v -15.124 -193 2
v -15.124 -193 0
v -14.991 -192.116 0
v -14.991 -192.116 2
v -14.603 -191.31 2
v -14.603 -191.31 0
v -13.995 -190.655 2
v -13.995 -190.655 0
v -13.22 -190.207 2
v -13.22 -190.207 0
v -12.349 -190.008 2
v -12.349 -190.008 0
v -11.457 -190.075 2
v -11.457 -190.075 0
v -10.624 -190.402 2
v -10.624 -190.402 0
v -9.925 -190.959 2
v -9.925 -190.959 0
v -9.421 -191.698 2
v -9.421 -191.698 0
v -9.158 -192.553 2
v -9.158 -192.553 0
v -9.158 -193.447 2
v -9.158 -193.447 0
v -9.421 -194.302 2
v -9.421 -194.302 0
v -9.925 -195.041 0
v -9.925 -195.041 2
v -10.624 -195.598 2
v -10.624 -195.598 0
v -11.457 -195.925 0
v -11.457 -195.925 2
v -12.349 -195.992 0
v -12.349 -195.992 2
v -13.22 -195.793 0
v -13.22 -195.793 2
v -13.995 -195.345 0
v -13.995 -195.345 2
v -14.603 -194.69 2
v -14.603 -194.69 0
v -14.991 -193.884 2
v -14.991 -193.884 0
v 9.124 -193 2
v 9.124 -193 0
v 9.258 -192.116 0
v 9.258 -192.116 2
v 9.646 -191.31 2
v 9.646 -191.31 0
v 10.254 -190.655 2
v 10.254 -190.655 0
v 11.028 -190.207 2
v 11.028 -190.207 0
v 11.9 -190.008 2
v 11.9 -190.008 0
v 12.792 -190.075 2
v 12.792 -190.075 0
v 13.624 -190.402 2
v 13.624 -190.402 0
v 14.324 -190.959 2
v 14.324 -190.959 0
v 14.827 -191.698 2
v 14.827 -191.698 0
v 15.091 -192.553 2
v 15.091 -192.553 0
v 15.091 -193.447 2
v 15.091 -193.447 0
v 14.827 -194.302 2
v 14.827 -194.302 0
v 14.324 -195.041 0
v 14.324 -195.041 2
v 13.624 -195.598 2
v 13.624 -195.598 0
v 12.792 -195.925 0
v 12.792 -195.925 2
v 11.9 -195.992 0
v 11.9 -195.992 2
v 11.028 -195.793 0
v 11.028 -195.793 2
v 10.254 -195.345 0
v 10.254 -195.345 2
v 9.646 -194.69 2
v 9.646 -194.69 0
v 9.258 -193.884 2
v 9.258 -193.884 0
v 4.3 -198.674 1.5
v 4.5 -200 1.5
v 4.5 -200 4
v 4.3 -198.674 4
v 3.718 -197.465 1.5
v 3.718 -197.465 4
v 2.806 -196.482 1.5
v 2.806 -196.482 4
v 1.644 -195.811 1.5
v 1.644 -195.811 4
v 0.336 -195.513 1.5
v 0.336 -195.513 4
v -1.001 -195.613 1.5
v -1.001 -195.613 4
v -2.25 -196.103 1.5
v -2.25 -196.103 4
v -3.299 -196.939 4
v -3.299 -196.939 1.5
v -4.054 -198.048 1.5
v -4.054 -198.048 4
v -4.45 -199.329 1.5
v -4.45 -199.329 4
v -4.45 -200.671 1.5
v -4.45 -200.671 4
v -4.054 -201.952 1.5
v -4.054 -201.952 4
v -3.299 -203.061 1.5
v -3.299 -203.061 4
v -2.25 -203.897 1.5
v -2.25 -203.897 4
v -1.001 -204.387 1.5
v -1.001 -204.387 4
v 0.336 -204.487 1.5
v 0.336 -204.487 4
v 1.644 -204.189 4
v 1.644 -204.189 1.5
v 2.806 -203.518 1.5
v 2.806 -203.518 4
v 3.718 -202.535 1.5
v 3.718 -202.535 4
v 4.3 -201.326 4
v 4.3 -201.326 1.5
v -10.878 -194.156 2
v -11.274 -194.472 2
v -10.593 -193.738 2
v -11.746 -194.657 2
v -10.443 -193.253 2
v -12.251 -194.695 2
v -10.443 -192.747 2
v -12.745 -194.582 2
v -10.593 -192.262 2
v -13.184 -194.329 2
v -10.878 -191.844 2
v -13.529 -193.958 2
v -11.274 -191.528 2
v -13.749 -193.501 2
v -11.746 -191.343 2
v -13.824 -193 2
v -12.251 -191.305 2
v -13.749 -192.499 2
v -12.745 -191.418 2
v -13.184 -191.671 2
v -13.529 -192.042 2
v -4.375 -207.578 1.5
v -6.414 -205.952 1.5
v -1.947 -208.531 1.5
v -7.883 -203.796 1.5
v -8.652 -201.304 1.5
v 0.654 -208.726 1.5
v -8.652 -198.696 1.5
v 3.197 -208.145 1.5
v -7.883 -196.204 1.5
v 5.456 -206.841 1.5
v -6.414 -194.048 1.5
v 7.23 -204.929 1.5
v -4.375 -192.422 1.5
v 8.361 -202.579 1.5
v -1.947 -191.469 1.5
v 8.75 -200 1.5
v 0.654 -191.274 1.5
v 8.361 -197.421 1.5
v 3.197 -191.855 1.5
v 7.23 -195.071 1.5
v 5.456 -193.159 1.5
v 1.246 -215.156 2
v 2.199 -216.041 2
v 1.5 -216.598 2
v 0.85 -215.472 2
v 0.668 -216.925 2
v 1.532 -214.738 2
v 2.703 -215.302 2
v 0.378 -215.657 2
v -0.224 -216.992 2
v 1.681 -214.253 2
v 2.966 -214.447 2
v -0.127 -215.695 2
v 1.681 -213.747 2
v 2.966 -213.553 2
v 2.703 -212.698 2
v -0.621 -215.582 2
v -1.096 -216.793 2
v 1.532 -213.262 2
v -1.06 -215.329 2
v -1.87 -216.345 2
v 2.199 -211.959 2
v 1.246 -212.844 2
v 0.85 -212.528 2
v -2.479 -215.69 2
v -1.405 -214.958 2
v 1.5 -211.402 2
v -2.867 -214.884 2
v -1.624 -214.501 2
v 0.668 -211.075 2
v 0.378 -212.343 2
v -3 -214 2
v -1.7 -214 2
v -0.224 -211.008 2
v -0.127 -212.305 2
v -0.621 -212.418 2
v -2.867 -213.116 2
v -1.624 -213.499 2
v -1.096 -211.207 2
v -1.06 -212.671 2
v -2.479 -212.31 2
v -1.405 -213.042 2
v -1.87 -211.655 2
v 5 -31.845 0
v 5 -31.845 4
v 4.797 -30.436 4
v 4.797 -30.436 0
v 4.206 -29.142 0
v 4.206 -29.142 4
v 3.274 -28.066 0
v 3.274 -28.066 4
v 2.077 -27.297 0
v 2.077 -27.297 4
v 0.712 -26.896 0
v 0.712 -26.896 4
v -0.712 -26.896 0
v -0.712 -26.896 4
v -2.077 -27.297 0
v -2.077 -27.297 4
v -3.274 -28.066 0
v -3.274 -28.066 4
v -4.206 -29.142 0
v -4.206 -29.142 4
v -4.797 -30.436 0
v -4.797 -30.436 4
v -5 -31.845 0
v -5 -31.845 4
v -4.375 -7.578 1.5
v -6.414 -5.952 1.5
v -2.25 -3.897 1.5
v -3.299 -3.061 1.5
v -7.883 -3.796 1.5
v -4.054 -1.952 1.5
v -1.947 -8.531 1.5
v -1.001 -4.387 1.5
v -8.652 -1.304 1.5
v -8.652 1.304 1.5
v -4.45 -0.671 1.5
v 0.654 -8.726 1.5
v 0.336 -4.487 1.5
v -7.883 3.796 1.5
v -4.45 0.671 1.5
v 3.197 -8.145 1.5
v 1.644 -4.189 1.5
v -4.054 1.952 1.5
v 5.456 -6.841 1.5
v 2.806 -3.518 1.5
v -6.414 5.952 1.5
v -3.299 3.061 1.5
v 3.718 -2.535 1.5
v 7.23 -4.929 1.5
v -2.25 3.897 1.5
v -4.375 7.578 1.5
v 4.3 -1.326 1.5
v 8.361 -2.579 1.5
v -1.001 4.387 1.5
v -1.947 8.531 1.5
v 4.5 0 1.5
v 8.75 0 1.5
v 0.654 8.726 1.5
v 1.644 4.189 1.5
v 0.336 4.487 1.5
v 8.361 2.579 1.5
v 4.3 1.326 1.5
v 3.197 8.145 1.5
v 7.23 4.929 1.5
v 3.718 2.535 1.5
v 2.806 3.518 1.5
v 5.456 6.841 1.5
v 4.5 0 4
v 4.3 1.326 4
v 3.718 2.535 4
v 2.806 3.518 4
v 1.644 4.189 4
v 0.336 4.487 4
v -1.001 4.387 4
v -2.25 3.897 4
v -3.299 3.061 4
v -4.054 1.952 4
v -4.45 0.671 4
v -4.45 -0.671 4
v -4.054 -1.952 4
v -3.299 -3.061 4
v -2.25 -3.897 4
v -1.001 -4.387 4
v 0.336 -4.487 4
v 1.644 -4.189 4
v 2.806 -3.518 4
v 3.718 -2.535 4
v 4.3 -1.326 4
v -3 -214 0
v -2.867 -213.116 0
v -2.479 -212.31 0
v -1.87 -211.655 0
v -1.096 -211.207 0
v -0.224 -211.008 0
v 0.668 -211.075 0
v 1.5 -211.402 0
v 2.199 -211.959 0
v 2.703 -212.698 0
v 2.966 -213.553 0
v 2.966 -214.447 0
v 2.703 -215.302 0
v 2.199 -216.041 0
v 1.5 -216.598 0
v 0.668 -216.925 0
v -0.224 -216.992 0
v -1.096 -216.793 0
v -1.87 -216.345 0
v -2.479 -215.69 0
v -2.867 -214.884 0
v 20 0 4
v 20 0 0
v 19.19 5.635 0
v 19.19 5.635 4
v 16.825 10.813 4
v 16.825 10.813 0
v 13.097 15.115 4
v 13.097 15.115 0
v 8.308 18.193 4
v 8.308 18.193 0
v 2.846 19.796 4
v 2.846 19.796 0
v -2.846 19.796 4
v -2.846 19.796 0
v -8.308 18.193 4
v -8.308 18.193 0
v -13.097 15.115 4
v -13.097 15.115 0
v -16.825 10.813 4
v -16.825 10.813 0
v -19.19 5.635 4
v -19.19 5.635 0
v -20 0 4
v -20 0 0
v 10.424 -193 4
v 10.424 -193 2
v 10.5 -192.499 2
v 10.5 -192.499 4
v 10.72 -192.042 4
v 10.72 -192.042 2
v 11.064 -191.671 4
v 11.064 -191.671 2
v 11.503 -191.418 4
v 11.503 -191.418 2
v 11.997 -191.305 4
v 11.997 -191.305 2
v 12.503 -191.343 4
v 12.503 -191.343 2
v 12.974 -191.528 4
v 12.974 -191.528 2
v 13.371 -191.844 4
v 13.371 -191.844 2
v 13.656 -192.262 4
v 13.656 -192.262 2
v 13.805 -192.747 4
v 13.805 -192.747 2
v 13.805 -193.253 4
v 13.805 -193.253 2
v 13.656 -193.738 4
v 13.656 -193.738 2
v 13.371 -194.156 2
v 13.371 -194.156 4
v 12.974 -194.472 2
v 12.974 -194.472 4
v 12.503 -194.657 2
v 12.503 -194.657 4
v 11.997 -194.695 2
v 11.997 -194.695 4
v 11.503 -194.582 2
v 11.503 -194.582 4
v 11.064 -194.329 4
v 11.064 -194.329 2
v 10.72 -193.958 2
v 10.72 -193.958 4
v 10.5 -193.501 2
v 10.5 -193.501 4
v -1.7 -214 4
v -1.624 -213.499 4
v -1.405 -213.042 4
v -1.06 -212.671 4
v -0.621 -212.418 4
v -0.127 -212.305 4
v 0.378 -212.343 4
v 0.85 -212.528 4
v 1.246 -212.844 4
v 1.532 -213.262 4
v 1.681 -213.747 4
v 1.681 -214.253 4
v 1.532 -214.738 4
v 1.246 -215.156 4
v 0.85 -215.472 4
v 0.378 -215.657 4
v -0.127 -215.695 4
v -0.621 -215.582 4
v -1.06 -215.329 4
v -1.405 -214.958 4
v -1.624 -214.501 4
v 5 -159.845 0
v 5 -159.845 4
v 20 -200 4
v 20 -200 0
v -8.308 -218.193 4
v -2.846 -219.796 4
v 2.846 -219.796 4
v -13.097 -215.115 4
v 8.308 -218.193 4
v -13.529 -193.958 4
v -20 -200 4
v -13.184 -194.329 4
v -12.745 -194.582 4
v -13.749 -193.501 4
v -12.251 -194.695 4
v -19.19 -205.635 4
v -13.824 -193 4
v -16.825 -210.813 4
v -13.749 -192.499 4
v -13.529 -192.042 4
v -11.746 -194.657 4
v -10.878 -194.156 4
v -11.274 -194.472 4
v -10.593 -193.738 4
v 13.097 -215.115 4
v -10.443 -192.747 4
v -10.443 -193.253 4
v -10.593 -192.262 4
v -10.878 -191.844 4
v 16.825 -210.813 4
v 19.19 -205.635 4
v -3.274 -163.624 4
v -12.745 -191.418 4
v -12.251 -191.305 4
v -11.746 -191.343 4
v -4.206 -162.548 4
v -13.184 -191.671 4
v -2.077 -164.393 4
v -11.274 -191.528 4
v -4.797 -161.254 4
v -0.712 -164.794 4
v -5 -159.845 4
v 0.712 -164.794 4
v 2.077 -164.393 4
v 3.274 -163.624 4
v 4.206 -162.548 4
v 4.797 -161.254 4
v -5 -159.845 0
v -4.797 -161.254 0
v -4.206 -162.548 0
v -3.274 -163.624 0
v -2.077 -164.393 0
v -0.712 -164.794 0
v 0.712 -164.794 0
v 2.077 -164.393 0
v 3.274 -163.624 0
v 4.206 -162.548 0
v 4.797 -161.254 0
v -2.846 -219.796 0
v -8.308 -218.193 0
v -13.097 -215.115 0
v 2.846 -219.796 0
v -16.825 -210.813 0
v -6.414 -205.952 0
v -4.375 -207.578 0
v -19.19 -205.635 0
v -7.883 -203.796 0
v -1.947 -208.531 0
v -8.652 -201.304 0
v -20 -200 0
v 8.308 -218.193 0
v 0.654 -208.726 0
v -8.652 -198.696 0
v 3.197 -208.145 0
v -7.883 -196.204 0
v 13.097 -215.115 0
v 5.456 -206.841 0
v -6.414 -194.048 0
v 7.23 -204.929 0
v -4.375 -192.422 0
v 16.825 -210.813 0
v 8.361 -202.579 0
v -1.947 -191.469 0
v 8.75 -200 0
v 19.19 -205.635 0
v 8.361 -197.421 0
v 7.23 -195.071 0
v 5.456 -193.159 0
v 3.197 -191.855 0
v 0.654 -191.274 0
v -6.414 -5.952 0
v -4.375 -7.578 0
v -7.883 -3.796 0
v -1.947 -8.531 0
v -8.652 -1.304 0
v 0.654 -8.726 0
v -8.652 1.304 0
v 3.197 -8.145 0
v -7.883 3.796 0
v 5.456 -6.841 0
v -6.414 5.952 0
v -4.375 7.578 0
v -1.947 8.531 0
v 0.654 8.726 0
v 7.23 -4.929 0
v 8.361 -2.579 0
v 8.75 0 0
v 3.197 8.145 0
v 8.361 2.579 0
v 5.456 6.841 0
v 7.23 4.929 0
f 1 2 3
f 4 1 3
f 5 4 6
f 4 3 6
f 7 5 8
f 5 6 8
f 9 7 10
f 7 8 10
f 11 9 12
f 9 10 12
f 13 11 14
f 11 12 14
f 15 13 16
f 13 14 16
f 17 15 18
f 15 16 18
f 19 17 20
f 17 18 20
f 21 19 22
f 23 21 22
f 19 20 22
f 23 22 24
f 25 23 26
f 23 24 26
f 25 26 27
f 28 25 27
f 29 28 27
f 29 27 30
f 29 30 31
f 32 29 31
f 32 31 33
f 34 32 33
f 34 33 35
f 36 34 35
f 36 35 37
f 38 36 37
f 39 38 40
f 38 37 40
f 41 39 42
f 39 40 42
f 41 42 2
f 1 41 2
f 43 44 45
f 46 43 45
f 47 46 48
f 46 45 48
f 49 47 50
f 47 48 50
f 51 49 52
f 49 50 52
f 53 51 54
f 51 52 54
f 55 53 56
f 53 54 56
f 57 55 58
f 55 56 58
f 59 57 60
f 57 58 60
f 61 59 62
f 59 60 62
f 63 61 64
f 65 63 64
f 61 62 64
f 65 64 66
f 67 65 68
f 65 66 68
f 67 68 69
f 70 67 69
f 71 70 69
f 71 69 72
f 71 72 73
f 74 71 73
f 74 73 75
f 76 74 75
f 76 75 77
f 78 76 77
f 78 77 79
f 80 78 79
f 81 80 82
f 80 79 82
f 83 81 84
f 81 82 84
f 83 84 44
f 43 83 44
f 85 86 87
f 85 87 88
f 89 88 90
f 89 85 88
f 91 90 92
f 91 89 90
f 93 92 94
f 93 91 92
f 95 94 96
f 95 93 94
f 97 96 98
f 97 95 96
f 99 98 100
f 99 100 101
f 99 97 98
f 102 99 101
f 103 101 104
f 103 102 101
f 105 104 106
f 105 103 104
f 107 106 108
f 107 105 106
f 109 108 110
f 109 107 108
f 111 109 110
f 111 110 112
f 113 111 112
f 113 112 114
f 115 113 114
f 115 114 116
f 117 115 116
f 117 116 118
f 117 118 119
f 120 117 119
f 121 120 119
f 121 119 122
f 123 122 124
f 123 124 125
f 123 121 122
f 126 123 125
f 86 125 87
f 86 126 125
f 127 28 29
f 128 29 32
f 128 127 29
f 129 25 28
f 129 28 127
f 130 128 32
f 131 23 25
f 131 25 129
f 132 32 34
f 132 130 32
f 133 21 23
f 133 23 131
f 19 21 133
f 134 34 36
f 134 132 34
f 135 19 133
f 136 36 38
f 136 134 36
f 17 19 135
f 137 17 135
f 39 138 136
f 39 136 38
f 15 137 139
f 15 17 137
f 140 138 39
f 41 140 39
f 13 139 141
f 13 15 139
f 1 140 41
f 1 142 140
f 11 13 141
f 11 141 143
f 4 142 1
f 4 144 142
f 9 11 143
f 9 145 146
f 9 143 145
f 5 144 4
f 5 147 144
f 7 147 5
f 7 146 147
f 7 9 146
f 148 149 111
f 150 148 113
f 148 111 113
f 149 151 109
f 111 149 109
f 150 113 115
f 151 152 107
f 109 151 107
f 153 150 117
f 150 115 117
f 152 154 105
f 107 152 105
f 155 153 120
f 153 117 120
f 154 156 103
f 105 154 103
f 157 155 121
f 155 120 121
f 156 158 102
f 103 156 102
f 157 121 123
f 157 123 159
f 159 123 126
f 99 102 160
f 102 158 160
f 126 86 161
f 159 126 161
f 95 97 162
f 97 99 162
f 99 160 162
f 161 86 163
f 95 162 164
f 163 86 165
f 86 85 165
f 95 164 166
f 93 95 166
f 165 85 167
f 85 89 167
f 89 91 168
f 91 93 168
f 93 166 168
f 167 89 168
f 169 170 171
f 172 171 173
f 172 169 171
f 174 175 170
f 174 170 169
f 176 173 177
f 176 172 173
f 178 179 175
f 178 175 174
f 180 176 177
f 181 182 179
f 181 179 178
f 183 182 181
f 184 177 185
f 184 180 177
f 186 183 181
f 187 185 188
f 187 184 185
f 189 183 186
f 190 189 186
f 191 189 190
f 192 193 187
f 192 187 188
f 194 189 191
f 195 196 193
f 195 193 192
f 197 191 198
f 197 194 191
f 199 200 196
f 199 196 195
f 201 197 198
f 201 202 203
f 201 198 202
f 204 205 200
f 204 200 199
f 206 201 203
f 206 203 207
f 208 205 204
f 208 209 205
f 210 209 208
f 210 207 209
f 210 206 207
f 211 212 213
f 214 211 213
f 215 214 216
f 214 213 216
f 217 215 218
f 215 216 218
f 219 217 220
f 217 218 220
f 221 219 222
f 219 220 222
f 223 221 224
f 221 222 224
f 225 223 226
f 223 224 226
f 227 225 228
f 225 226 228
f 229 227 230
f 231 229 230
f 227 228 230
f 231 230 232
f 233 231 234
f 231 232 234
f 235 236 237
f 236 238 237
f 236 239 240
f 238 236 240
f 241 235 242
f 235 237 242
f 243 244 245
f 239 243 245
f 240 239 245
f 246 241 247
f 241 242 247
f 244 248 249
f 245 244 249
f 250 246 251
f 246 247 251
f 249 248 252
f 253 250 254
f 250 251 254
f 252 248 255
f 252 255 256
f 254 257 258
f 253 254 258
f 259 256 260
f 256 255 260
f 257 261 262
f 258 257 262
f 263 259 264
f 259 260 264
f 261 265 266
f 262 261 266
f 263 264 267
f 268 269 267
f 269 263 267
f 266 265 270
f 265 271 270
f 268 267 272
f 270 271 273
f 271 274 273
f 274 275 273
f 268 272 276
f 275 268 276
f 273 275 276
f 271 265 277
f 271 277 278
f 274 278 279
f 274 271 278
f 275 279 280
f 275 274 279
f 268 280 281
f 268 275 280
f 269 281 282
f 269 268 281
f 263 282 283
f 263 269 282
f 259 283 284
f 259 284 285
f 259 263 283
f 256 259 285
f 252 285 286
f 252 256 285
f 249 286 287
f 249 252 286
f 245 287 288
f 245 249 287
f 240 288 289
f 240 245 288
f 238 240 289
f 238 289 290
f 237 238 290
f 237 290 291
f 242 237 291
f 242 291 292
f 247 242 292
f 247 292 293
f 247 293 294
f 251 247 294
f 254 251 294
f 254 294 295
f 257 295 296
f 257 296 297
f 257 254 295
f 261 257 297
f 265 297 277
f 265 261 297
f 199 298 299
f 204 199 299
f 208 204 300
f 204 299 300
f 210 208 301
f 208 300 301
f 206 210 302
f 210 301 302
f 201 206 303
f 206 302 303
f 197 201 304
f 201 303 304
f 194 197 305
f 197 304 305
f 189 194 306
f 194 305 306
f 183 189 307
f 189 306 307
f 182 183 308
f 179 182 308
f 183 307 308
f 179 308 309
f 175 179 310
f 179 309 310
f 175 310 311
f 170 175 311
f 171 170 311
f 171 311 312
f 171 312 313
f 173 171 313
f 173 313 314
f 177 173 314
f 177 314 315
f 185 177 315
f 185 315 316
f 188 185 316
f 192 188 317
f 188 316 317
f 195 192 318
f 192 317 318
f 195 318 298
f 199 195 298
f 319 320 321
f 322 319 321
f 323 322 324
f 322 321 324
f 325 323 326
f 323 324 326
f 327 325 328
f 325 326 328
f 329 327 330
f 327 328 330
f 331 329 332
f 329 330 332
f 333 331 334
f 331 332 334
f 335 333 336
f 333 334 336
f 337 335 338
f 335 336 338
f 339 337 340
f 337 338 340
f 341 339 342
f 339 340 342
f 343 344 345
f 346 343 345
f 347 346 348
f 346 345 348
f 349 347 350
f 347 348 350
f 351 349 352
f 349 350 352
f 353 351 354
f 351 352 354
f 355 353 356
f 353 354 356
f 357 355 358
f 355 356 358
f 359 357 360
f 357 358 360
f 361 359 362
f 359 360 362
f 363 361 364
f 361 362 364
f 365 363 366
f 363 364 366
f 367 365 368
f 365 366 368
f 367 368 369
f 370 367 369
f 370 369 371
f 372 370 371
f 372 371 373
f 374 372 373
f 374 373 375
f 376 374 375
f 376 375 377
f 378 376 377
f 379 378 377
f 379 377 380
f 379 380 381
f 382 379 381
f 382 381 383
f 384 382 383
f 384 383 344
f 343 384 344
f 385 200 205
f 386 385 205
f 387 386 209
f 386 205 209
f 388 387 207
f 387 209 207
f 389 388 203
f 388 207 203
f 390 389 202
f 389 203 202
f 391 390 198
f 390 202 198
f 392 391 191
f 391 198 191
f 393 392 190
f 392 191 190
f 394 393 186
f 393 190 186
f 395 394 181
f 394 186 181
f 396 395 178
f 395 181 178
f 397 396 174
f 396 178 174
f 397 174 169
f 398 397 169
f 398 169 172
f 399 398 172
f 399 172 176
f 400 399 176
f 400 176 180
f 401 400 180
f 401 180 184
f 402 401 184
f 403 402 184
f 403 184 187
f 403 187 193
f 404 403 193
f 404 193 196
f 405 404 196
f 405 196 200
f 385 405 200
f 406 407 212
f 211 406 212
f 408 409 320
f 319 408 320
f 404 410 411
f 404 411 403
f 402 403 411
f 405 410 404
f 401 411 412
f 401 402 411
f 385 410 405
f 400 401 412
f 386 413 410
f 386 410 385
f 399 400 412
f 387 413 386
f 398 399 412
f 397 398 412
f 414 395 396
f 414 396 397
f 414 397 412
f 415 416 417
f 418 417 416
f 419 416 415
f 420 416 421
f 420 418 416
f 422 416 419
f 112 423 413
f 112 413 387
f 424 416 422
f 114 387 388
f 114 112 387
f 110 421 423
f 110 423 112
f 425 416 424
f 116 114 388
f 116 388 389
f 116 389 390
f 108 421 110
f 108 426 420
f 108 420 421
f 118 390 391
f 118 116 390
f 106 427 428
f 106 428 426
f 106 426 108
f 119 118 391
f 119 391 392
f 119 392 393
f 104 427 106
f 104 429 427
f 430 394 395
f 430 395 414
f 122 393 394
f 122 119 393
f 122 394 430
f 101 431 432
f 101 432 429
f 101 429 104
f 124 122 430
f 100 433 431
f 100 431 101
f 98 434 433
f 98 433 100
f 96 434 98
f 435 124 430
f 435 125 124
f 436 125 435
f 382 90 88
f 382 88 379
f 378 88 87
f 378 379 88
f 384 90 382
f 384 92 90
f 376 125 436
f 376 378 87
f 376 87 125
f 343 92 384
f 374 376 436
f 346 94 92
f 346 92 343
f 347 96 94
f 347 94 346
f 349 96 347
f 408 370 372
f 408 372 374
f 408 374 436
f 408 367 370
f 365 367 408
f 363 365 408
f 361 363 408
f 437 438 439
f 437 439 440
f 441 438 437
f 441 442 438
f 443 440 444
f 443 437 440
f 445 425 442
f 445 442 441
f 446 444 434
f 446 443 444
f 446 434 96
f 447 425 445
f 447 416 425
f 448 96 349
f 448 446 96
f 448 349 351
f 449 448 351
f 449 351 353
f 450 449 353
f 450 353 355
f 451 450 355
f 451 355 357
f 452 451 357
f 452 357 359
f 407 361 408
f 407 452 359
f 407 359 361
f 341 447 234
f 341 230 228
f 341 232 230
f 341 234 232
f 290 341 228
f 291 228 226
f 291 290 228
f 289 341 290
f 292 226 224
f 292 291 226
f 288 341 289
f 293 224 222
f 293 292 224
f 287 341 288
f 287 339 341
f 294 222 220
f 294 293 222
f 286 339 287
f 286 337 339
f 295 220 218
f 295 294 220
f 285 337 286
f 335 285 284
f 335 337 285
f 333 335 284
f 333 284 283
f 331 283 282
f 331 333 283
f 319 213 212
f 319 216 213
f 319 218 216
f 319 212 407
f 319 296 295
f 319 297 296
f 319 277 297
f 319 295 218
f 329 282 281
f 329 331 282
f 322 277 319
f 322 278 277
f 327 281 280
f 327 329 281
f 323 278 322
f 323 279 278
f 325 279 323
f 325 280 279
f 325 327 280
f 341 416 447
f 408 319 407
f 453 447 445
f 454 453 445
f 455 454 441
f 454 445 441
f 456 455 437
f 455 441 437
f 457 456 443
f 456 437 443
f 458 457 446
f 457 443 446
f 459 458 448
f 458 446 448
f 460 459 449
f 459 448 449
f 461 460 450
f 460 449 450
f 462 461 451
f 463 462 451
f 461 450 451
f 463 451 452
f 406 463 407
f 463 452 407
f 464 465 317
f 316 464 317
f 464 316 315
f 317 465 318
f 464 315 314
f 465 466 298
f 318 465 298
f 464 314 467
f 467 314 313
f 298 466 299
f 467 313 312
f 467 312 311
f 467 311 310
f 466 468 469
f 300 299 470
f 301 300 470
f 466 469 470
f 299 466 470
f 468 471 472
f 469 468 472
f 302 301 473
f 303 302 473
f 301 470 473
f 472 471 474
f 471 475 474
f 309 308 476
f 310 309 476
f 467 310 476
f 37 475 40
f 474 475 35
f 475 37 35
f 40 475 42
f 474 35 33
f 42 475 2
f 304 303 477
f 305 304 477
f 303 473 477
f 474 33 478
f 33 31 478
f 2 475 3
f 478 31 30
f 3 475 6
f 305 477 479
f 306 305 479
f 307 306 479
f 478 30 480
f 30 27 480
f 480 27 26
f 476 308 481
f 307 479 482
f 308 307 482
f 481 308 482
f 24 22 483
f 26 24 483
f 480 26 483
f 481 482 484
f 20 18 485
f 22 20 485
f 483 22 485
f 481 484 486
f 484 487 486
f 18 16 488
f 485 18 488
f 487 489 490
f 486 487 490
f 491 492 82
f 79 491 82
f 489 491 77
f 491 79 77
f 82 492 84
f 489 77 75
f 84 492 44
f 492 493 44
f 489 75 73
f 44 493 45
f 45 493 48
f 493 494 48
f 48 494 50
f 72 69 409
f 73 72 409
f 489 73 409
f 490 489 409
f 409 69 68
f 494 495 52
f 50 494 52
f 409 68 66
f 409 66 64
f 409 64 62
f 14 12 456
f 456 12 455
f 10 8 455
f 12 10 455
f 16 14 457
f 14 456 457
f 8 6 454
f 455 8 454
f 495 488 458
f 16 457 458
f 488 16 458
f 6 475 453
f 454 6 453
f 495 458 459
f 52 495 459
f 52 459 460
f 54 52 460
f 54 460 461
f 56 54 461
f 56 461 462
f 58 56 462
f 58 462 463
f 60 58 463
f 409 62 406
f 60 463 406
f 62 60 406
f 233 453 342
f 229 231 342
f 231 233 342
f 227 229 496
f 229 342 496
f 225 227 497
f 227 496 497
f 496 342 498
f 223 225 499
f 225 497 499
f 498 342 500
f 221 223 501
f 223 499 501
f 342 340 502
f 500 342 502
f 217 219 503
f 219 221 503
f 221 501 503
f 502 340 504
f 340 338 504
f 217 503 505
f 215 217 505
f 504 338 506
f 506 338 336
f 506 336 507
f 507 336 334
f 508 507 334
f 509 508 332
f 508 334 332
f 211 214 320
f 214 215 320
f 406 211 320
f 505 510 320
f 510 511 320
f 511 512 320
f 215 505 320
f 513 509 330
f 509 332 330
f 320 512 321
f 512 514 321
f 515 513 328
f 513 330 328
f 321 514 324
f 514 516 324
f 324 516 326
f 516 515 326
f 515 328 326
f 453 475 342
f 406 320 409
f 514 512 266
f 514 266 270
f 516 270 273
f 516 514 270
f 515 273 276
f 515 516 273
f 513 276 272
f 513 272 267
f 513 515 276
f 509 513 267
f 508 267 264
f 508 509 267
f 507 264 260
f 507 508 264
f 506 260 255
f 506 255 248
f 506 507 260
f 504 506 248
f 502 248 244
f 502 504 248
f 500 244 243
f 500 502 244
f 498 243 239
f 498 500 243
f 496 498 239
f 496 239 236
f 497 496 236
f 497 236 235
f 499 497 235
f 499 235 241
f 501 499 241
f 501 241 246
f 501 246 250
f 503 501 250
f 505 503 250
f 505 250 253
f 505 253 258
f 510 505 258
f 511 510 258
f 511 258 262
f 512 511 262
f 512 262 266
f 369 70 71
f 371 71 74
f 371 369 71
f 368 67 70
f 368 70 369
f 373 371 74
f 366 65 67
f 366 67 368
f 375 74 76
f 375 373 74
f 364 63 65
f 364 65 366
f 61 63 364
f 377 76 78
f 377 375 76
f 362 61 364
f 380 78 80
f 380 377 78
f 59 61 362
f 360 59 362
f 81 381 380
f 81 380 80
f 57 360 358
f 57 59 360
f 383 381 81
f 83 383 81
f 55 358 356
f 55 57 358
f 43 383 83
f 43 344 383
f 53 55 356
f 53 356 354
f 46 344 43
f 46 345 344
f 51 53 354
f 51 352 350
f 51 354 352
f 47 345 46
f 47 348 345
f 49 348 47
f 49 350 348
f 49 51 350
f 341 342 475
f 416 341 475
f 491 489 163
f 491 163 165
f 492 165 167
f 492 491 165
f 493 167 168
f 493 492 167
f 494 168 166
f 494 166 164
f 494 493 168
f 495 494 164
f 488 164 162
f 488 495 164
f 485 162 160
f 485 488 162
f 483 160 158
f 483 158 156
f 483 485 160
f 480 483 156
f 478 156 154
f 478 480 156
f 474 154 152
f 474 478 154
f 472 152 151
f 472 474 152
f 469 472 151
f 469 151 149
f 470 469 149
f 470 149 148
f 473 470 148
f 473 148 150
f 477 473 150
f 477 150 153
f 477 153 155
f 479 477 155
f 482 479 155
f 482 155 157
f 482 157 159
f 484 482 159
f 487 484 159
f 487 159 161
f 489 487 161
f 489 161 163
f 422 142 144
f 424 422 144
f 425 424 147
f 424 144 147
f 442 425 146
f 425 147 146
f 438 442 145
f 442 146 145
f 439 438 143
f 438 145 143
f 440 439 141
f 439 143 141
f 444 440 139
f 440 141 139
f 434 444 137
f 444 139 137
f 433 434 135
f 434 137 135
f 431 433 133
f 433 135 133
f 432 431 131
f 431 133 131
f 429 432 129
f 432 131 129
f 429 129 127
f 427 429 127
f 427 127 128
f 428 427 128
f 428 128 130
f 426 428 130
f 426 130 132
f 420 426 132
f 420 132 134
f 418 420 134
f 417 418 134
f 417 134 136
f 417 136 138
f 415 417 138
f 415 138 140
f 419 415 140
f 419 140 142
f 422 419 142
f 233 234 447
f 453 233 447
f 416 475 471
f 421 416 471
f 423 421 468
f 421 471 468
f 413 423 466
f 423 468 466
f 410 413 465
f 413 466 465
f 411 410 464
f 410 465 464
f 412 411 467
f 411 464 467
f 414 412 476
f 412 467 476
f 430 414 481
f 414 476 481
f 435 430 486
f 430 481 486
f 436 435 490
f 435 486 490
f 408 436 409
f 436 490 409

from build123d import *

# Parameters (mm, degrees)
SKETCH_1_R          = 8.75
EXTRUDE_1_DEPTH     = 4
EXTRUDE_START       = -2.5
SKETCH_3_R          = 8.75
SKETCH_3_R_2        = 4.5
EXTRUDE_2_DEPTH     = 2.5
CUT_EXTRUDE_2_DEPTH = 221.943431674
SKETCH_4_R          = 1.7
CUT_EXTRUDE_3_DEPTH = 221.943431674
SKETCH_5_R          = 3
CUT_EXTRUDE_4_DEPTH = 2


with BuildPart() as part:
    # 草图1 → 凸台-拉伸1 (new body)
    with BuildSketch(Plane.XY):
        with BuildLine():
            Line((-20, 0), (-20, -200))
            ThreePointArc((-20, -200), (0, -220), (20, -200))
            Line((20, -200), (20, 0))
            ThreePointArc((20, 0), (0, 20), (-20, 0))
        make_face()
        Circle(SKETCH_1_R, mode=Mode.SUBTRACT)
        with Locations((0, -200)):
            Circle(SKETCH_1_R, mode=Mode.SUBTRACT)
    extrude(amount=EXTRUDE_1_DEPTH)

    # 草图3 → 凸台-拉伸2 (add)
    # profile 1 of 2: a face of its own
    with BuildSketch(Plane.XY.offset(4).offset(EXTRUDE_START)):
        Circle(SKETCH_3_R)
        Circle(SKETCH_3_R_2, mode=Mode.SUBTRACT)
    # profile 2 of 2: a face of its own
    with BuildSketch(Plane.XY.offset(4).offset(EXTRUDE_START)):
        with Locations((0, -200)):
            Circle(SKETCH_3_R)
        with Locations((0, -200)):
            Circle(SKETCH_3_R_2, mode=Mode.SUBTRACT)
    extrude(amount=EXTRUDE_2_DEPTH)

    # 草图2 → 切除-拉伸2 (cut, through all)
    with BuildSketch(Plane.XY.offset(4)):
        with BuildLine():
            Line((-5, -31.845004689), (-5, -159.845004689))
            ThreePointArc((-5, -159.845004689), (0, -164.845004689), (5, -159.845004689))
            Line((5, -159.845004689), (5, -31.845004689))
            ThreePointArc((5, -31.845004689), (0, -26.845004689), (-5, -31.845004689))
        make_face()
    extrude(amount=-CUT_EXTRUDE_2_DEPTH, mode=Mode.SUBTRACT)

    # 草图4 → 切除-拉伸3 (cut, through all)
    with BuildSketch(Plane(origin=(0, 0, 0), x_dir=(-1, 0, 0), z_dir=(0, 0, -1))):
        with Locations((0, -214)):
            Circle(SKETCH_4_R)
        with Locations((-12.124355653, -193)):
            Circle(SKETCH_4_R)
        with Locations((12.124355653, -193)):
            Circle(SKETCH_4_R)
    extrude(amount=-CUT_EXTRUDE_3_DEPTH, mode=Mode.SUBTRACT)

    # 草图5 → 切除-拉伸4 (cut)
    with BuildSketch(Plane(origin=(0, 0, 0), x_dir=(-1, 0, 0), z_dir=(0, 0, -1))):
        with Locations((-12.124355653, -193)):
            Circle(SKETCH_5_R)
        with Locations((12.124355653, -193)):
            Circle(SKETCH_5_R)
        with Locations((0, -214)):
            Circle(SKETCH_5_R)
    extrude(amount=-CUT_EXTRUDE_4_DEPTH, mode=Mode.SUBTRACT)


solid = part.part
